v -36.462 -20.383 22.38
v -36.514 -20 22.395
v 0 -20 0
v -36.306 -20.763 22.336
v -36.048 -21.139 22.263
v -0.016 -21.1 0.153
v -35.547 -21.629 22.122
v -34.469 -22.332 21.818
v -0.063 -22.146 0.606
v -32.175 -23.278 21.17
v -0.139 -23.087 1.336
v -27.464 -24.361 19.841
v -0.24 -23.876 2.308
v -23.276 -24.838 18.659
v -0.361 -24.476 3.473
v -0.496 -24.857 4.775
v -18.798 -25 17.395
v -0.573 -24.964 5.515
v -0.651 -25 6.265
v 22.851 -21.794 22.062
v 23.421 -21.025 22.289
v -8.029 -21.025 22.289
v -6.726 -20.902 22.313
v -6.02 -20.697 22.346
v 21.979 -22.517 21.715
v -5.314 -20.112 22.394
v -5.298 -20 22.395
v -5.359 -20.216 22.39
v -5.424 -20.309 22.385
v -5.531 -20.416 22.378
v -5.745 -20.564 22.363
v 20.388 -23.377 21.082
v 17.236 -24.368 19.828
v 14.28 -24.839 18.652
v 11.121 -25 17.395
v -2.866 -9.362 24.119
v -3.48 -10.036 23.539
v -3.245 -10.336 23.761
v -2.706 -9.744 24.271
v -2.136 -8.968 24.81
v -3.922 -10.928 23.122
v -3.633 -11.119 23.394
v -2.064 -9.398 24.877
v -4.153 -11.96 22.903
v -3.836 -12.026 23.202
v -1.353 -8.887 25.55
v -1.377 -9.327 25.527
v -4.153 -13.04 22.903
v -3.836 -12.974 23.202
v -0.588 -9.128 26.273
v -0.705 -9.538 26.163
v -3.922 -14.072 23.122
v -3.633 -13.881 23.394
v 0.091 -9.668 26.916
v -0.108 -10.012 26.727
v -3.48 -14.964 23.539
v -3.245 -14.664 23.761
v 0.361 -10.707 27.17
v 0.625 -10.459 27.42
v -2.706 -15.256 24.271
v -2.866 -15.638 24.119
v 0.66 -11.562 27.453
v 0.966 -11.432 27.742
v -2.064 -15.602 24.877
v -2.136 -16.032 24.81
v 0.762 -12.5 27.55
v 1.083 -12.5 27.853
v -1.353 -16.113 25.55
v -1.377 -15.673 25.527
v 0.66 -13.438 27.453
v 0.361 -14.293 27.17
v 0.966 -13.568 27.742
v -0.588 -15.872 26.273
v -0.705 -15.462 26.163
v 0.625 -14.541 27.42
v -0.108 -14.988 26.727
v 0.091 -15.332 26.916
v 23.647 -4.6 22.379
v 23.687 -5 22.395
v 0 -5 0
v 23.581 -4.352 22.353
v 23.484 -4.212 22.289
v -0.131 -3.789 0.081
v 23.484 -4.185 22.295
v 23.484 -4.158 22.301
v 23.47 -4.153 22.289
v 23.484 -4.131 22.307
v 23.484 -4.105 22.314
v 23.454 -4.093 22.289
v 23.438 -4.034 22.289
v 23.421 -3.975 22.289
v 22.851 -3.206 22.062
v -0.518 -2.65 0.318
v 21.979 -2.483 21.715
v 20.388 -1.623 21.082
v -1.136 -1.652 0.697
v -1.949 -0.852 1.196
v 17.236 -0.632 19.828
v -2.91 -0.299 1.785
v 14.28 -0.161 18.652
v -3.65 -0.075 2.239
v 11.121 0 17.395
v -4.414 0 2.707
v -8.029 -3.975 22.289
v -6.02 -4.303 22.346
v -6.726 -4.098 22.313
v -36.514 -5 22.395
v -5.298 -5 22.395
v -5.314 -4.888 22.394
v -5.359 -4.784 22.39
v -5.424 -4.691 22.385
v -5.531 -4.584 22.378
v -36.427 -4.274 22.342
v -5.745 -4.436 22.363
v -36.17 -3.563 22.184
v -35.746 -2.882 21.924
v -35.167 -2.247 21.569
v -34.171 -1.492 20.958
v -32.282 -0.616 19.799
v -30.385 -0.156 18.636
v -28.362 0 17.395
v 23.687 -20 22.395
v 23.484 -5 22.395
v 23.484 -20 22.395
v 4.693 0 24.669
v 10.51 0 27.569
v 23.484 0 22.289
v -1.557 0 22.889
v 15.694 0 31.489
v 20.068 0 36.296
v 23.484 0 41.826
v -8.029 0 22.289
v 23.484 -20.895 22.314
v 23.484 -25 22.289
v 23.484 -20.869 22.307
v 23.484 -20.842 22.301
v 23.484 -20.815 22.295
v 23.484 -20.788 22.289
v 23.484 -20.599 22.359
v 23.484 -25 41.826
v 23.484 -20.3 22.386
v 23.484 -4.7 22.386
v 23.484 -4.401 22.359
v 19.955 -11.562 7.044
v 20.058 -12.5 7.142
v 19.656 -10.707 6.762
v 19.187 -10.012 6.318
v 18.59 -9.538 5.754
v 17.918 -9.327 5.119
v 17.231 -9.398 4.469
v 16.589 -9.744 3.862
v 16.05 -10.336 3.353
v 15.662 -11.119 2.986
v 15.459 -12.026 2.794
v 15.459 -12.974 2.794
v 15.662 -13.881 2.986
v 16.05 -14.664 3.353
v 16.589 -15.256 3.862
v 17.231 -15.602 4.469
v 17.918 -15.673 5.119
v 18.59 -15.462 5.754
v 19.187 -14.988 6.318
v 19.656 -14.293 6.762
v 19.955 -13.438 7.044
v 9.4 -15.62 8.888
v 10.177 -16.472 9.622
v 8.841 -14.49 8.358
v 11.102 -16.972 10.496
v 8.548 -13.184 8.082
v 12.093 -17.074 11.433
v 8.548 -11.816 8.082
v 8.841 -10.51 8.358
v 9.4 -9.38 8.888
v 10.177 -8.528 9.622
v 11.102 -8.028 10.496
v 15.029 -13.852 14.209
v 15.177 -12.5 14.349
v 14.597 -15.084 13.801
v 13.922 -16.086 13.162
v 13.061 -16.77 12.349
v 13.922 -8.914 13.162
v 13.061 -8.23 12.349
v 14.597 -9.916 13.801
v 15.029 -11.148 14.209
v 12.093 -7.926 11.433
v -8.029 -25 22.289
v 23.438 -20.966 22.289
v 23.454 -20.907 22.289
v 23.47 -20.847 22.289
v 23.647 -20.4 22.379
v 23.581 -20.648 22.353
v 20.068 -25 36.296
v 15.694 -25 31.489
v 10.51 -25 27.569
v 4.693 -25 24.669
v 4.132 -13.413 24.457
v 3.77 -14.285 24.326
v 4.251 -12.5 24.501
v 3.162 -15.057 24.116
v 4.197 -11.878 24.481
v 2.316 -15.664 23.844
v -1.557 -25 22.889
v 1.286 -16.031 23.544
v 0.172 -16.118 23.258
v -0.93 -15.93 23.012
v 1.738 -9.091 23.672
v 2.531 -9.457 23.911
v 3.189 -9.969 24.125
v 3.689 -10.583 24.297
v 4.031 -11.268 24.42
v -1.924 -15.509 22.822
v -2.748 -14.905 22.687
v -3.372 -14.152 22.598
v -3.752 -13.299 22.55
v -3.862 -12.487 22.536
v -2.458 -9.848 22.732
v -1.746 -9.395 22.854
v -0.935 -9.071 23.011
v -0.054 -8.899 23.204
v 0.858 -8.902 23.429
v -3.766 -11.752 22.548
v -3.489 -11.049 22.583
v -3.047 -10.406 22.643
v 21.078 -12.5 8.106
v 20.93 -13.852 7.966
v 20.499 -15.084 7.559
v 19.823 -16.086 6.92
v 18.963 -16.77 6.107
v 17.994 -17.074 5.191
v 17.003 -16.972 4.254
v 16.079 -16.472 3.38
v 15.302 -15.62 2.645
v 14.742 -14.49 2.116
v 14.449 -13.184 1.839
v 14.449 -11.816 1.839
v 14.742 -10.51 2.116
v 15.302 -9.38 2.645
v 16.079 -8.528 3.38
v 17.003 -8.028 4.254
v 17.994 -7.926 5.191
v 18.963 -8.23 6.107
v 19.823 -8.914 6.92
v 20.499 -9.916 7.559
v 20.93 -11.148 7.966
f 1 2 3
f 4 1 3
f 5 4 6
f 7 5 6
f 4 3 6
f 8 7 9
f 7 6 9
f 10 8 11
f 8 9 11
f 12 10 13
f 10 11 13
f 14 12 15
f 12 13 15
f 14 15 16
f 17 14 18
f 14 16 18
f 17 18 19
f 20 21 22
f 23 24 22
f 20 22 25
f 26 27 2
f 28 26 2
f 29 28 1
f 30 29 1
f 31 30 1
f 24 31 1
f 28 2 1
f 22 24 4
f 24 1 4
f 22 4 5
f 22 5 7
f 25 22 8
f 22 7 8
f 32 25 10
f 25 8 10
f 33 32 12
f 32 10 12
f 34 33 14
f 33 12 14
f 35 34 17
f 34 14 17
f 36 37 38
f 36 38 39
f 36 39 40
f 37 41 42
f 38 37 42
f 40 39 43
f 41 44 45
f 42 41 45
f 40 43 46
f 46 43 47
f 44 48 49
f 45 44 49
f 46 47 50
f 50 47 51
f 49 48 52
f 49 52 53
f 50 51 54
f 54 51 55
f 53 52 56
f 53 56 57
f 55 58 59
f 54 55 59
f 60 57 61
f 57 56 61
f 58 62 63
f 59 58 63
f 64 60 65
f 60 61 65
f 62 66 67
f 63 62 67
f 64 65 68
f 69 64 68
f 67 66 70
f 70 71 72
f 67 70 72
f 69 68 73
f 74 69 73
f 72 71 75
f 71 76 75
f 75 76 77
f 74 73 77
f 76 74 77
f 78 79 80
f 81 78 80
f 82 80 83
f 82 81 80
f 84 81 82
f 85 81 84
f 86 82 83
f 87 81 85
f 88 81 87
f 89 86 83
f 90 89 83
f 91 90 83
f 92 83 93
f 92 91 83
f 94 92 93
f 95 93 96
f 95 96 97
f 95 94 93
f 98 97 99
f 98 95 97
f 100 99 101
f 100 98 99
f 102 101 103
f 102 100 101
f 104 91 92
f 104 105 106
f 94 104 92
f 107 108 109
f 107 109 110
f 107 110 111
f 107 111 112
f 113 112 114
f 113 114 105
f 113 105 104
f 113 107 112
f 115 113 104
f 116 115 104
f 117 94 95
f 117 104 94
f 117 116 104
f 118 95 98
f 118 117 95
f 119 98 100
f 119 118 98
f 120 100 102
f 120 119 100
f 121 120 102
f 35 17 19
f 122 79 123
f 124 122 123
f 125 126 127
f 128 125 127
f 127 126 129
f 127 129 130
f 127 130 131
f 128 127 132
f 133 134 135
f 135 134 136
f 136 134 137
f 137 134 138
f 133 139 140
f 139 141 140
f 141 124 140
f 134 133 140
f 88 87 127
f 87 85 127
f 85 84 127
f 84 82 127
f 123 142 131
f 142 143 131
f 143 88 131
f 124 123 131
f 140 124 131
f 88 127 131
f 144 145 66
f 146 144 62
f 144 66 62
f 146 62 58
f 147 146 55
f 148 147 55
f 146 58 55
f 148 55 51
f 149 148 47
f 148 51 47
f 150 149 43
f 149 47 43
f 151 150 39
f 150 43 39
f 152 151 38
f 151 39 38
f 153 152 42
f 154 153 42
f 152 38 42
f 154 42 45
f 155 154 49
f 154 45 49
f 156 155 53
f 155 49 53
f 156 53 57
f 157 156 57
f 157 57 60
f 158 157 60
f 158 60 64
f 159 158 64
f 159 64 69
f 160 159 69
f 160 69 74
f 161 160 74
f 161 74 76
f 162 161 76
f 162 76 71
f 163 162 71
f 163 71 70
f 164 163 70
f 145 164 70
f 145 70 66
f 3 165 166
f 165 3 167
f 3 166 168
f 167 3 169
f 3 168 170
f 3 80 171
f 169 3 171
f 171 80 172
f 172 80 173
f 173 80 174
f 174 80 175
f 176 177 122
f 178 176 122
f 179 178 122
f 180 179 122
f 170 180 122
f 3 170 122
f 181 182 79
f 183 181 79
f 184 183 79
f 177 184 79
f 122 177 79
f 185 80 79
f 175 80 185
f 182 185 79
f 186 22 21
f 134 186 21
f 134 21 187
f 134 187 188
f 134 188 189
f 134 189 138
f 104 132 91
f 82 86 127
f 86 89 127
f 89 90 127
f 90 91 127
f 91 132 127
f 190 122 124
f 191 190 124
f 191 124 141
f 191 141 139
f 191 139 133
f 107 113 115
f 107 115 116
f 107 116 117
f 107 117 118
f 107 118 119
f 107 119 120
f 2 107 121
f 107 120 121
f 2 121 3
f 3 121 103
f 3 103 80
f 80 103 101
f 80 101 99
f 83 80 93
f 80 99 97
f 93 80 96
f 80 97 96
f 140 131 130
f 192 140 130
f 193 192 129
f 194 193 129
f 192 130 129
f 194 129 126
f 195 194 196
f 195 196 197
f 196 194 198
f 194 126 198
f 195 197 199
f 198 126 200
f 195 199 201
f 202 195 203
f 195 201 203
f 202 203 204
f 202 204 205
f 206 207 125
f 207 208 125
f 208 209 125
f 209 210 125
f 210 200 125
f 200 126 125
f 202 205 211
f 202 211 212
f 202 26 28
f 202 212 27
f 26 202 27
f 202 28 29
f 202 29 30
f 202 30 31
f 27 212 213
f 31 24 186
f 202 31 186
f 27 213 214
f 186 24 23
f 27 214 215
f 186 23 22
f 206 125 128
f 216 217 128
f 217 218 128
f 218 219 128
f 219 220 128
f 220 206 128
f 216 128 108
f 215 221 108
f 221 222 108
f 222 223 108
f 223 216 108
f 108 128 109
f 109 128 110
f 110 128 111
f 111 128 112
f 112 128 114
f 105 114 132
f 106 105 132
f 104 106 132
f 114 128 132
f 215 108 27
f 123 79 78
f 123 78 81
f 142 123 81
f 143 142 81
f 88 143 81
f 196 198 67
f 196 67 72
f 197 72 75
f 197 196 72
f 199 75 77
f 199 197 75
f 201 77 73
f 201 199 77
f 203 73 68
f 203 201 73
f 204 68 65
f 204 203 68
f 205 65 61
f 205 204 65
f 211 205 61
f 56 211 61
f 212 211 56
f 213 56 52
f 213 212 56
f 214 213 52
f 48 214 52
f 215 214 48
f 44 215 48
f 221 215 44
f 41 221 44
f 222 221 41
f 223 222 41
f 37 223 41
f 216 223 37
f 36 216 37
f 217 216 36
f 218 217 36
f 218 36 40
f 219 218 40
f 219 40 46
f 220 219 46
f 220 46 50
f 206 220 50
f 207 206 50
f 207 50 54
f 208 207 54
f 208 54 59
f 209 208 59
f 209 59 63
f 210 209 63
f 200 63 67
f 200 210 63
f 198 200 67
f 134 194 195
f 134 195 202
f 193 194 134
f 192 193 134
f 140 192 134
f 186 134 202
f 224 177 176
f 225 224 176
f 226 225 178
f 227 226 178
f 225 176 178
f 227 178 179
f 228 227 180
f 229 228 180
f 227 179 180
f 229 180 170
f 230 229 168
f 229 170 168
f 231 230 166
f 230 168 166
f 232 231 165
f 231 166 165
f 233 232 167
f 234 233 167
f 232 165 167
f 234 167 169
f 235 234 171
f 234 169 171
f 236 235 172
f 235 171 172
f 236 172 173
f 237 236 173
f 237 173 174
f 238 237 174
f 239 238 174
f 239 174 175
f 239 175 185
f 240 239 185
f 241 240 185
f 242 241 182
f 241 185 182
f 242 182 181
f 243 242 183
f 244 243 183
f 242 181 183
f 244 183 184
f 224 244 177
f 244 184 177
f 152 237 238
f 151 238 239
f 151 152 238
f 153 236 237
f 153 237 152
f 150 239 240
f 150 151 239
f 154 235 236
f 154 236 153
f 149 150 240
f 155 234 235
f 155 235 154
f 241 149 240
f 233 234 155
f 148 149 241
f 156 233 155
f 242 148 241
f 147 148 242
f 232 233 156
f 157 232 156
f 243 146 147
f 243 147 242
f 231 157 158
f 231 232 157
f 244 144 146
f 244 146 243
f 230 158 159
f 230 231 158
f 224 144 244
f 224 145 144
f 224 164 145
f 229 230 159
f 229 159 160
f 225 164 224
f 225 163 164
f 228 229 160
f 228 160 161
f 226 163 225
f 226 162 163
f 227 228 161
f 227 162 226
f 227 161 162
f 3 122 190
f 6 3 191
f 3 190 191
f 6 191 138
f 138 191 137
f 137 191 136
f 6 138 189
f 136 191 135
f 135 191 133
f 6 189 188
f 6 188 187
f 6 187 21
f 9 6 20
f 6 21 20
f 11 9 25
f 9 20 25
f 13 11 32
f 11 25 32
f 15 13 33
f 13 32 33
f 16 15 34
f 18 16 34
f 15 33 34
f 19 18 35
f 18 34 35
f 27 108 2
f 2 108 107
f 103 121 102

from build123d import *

# Parameters (mm, degrees)
F1_DEPTH  = 25
F2_R      = 5
F4_DEPTH  = 25
F5_R      = 4.586738227
F6_DEPTH  = 8.5901785642
F7_R      = 3.6228791996
F8_DEPTH  = 28.0857570469
F9_R      = 3.1821948937
F10_DEPTH = 44.3071853369


with BuildPart() as f1:
    # F0 (on Front) → F1 (new body)
    with BuildSketch(Plane.XZ):
        Polygon((-36.51381284, 22.3948657513), (0, 0), (23.6873179674, 22.3948657513), align=None)
    extrude(amount=F1_DEPTH)

    # F2
    f2_edges = [f1.edges().sort_by_distance(p)[0] for p in [
        (11.843659, -25, 11.197433),
        (11.843659, 0, 11.197433),
        (-18.256906, -25, 11.197433),
        (-6.413247, 0, 22.394866),
        (-6.413247, -25, 22.394866),
    ]]
    fillet(f2_edges, radius=F2_R)

    # F3 (on Front) → F4 (join)
    with BuildSketch(Plane.XZ):
        with BuildLine():
            Line((-8.0289142206, 22.2887210548), (23.4841555357, 22.2887210548))
            Line((23.4841555357, 22.2887210548), (23.4841555357, 41.8256605239))
            ThreePointArc((23.4841555357, 41.8256605239), (10.5100013982, 27.5692125926), (-8.0289142206, 22.2887210548))
        make_face()
    extrude(amount=F4_DEPTH)

    # F5 (on face) → F6 (join)
    with BuildSketch(Plane(origin=(0, 0, 0), x_dir=(0.7266530358, 0, 0.6870046329), z_dir=(0.6870046329, 0, -0.7266530358))):
        with Locations((16.2989190171, 12.5)):
            Circle(F5_R)
    extrude(amount=F6_DEPTH)

    # F7 (on face) → F8 (join)
    with BuildSketch(Plane(origin=(5.9014924708, 0, -6.2420793316), x_dir=(0.7266530358, 0, 0.6870046329), z_dir=(0.6870046329, 0, -0.7266530358))):
        with Locations((16.2989190171, 12.5)):
            Circle(F7_R)
    extrude(amount=-F8_DEPTH)

    # F9 (on face) → F10 (cut)
    with BuildSketch(Plane(origin=(-13.3935527382, 0, 14.1665212888), x_dir=(0.7266530358, 0, 0.6870046329), z_dir=(-0.6870046329, 0, 0.7266530358))):
        with Locations((16.2989190171, -12.5)):
            Circle(F9_R)
    extrude(amount=-F10_DEPTH, mode=Mode.SUBTRACT)


solid = f1.part
